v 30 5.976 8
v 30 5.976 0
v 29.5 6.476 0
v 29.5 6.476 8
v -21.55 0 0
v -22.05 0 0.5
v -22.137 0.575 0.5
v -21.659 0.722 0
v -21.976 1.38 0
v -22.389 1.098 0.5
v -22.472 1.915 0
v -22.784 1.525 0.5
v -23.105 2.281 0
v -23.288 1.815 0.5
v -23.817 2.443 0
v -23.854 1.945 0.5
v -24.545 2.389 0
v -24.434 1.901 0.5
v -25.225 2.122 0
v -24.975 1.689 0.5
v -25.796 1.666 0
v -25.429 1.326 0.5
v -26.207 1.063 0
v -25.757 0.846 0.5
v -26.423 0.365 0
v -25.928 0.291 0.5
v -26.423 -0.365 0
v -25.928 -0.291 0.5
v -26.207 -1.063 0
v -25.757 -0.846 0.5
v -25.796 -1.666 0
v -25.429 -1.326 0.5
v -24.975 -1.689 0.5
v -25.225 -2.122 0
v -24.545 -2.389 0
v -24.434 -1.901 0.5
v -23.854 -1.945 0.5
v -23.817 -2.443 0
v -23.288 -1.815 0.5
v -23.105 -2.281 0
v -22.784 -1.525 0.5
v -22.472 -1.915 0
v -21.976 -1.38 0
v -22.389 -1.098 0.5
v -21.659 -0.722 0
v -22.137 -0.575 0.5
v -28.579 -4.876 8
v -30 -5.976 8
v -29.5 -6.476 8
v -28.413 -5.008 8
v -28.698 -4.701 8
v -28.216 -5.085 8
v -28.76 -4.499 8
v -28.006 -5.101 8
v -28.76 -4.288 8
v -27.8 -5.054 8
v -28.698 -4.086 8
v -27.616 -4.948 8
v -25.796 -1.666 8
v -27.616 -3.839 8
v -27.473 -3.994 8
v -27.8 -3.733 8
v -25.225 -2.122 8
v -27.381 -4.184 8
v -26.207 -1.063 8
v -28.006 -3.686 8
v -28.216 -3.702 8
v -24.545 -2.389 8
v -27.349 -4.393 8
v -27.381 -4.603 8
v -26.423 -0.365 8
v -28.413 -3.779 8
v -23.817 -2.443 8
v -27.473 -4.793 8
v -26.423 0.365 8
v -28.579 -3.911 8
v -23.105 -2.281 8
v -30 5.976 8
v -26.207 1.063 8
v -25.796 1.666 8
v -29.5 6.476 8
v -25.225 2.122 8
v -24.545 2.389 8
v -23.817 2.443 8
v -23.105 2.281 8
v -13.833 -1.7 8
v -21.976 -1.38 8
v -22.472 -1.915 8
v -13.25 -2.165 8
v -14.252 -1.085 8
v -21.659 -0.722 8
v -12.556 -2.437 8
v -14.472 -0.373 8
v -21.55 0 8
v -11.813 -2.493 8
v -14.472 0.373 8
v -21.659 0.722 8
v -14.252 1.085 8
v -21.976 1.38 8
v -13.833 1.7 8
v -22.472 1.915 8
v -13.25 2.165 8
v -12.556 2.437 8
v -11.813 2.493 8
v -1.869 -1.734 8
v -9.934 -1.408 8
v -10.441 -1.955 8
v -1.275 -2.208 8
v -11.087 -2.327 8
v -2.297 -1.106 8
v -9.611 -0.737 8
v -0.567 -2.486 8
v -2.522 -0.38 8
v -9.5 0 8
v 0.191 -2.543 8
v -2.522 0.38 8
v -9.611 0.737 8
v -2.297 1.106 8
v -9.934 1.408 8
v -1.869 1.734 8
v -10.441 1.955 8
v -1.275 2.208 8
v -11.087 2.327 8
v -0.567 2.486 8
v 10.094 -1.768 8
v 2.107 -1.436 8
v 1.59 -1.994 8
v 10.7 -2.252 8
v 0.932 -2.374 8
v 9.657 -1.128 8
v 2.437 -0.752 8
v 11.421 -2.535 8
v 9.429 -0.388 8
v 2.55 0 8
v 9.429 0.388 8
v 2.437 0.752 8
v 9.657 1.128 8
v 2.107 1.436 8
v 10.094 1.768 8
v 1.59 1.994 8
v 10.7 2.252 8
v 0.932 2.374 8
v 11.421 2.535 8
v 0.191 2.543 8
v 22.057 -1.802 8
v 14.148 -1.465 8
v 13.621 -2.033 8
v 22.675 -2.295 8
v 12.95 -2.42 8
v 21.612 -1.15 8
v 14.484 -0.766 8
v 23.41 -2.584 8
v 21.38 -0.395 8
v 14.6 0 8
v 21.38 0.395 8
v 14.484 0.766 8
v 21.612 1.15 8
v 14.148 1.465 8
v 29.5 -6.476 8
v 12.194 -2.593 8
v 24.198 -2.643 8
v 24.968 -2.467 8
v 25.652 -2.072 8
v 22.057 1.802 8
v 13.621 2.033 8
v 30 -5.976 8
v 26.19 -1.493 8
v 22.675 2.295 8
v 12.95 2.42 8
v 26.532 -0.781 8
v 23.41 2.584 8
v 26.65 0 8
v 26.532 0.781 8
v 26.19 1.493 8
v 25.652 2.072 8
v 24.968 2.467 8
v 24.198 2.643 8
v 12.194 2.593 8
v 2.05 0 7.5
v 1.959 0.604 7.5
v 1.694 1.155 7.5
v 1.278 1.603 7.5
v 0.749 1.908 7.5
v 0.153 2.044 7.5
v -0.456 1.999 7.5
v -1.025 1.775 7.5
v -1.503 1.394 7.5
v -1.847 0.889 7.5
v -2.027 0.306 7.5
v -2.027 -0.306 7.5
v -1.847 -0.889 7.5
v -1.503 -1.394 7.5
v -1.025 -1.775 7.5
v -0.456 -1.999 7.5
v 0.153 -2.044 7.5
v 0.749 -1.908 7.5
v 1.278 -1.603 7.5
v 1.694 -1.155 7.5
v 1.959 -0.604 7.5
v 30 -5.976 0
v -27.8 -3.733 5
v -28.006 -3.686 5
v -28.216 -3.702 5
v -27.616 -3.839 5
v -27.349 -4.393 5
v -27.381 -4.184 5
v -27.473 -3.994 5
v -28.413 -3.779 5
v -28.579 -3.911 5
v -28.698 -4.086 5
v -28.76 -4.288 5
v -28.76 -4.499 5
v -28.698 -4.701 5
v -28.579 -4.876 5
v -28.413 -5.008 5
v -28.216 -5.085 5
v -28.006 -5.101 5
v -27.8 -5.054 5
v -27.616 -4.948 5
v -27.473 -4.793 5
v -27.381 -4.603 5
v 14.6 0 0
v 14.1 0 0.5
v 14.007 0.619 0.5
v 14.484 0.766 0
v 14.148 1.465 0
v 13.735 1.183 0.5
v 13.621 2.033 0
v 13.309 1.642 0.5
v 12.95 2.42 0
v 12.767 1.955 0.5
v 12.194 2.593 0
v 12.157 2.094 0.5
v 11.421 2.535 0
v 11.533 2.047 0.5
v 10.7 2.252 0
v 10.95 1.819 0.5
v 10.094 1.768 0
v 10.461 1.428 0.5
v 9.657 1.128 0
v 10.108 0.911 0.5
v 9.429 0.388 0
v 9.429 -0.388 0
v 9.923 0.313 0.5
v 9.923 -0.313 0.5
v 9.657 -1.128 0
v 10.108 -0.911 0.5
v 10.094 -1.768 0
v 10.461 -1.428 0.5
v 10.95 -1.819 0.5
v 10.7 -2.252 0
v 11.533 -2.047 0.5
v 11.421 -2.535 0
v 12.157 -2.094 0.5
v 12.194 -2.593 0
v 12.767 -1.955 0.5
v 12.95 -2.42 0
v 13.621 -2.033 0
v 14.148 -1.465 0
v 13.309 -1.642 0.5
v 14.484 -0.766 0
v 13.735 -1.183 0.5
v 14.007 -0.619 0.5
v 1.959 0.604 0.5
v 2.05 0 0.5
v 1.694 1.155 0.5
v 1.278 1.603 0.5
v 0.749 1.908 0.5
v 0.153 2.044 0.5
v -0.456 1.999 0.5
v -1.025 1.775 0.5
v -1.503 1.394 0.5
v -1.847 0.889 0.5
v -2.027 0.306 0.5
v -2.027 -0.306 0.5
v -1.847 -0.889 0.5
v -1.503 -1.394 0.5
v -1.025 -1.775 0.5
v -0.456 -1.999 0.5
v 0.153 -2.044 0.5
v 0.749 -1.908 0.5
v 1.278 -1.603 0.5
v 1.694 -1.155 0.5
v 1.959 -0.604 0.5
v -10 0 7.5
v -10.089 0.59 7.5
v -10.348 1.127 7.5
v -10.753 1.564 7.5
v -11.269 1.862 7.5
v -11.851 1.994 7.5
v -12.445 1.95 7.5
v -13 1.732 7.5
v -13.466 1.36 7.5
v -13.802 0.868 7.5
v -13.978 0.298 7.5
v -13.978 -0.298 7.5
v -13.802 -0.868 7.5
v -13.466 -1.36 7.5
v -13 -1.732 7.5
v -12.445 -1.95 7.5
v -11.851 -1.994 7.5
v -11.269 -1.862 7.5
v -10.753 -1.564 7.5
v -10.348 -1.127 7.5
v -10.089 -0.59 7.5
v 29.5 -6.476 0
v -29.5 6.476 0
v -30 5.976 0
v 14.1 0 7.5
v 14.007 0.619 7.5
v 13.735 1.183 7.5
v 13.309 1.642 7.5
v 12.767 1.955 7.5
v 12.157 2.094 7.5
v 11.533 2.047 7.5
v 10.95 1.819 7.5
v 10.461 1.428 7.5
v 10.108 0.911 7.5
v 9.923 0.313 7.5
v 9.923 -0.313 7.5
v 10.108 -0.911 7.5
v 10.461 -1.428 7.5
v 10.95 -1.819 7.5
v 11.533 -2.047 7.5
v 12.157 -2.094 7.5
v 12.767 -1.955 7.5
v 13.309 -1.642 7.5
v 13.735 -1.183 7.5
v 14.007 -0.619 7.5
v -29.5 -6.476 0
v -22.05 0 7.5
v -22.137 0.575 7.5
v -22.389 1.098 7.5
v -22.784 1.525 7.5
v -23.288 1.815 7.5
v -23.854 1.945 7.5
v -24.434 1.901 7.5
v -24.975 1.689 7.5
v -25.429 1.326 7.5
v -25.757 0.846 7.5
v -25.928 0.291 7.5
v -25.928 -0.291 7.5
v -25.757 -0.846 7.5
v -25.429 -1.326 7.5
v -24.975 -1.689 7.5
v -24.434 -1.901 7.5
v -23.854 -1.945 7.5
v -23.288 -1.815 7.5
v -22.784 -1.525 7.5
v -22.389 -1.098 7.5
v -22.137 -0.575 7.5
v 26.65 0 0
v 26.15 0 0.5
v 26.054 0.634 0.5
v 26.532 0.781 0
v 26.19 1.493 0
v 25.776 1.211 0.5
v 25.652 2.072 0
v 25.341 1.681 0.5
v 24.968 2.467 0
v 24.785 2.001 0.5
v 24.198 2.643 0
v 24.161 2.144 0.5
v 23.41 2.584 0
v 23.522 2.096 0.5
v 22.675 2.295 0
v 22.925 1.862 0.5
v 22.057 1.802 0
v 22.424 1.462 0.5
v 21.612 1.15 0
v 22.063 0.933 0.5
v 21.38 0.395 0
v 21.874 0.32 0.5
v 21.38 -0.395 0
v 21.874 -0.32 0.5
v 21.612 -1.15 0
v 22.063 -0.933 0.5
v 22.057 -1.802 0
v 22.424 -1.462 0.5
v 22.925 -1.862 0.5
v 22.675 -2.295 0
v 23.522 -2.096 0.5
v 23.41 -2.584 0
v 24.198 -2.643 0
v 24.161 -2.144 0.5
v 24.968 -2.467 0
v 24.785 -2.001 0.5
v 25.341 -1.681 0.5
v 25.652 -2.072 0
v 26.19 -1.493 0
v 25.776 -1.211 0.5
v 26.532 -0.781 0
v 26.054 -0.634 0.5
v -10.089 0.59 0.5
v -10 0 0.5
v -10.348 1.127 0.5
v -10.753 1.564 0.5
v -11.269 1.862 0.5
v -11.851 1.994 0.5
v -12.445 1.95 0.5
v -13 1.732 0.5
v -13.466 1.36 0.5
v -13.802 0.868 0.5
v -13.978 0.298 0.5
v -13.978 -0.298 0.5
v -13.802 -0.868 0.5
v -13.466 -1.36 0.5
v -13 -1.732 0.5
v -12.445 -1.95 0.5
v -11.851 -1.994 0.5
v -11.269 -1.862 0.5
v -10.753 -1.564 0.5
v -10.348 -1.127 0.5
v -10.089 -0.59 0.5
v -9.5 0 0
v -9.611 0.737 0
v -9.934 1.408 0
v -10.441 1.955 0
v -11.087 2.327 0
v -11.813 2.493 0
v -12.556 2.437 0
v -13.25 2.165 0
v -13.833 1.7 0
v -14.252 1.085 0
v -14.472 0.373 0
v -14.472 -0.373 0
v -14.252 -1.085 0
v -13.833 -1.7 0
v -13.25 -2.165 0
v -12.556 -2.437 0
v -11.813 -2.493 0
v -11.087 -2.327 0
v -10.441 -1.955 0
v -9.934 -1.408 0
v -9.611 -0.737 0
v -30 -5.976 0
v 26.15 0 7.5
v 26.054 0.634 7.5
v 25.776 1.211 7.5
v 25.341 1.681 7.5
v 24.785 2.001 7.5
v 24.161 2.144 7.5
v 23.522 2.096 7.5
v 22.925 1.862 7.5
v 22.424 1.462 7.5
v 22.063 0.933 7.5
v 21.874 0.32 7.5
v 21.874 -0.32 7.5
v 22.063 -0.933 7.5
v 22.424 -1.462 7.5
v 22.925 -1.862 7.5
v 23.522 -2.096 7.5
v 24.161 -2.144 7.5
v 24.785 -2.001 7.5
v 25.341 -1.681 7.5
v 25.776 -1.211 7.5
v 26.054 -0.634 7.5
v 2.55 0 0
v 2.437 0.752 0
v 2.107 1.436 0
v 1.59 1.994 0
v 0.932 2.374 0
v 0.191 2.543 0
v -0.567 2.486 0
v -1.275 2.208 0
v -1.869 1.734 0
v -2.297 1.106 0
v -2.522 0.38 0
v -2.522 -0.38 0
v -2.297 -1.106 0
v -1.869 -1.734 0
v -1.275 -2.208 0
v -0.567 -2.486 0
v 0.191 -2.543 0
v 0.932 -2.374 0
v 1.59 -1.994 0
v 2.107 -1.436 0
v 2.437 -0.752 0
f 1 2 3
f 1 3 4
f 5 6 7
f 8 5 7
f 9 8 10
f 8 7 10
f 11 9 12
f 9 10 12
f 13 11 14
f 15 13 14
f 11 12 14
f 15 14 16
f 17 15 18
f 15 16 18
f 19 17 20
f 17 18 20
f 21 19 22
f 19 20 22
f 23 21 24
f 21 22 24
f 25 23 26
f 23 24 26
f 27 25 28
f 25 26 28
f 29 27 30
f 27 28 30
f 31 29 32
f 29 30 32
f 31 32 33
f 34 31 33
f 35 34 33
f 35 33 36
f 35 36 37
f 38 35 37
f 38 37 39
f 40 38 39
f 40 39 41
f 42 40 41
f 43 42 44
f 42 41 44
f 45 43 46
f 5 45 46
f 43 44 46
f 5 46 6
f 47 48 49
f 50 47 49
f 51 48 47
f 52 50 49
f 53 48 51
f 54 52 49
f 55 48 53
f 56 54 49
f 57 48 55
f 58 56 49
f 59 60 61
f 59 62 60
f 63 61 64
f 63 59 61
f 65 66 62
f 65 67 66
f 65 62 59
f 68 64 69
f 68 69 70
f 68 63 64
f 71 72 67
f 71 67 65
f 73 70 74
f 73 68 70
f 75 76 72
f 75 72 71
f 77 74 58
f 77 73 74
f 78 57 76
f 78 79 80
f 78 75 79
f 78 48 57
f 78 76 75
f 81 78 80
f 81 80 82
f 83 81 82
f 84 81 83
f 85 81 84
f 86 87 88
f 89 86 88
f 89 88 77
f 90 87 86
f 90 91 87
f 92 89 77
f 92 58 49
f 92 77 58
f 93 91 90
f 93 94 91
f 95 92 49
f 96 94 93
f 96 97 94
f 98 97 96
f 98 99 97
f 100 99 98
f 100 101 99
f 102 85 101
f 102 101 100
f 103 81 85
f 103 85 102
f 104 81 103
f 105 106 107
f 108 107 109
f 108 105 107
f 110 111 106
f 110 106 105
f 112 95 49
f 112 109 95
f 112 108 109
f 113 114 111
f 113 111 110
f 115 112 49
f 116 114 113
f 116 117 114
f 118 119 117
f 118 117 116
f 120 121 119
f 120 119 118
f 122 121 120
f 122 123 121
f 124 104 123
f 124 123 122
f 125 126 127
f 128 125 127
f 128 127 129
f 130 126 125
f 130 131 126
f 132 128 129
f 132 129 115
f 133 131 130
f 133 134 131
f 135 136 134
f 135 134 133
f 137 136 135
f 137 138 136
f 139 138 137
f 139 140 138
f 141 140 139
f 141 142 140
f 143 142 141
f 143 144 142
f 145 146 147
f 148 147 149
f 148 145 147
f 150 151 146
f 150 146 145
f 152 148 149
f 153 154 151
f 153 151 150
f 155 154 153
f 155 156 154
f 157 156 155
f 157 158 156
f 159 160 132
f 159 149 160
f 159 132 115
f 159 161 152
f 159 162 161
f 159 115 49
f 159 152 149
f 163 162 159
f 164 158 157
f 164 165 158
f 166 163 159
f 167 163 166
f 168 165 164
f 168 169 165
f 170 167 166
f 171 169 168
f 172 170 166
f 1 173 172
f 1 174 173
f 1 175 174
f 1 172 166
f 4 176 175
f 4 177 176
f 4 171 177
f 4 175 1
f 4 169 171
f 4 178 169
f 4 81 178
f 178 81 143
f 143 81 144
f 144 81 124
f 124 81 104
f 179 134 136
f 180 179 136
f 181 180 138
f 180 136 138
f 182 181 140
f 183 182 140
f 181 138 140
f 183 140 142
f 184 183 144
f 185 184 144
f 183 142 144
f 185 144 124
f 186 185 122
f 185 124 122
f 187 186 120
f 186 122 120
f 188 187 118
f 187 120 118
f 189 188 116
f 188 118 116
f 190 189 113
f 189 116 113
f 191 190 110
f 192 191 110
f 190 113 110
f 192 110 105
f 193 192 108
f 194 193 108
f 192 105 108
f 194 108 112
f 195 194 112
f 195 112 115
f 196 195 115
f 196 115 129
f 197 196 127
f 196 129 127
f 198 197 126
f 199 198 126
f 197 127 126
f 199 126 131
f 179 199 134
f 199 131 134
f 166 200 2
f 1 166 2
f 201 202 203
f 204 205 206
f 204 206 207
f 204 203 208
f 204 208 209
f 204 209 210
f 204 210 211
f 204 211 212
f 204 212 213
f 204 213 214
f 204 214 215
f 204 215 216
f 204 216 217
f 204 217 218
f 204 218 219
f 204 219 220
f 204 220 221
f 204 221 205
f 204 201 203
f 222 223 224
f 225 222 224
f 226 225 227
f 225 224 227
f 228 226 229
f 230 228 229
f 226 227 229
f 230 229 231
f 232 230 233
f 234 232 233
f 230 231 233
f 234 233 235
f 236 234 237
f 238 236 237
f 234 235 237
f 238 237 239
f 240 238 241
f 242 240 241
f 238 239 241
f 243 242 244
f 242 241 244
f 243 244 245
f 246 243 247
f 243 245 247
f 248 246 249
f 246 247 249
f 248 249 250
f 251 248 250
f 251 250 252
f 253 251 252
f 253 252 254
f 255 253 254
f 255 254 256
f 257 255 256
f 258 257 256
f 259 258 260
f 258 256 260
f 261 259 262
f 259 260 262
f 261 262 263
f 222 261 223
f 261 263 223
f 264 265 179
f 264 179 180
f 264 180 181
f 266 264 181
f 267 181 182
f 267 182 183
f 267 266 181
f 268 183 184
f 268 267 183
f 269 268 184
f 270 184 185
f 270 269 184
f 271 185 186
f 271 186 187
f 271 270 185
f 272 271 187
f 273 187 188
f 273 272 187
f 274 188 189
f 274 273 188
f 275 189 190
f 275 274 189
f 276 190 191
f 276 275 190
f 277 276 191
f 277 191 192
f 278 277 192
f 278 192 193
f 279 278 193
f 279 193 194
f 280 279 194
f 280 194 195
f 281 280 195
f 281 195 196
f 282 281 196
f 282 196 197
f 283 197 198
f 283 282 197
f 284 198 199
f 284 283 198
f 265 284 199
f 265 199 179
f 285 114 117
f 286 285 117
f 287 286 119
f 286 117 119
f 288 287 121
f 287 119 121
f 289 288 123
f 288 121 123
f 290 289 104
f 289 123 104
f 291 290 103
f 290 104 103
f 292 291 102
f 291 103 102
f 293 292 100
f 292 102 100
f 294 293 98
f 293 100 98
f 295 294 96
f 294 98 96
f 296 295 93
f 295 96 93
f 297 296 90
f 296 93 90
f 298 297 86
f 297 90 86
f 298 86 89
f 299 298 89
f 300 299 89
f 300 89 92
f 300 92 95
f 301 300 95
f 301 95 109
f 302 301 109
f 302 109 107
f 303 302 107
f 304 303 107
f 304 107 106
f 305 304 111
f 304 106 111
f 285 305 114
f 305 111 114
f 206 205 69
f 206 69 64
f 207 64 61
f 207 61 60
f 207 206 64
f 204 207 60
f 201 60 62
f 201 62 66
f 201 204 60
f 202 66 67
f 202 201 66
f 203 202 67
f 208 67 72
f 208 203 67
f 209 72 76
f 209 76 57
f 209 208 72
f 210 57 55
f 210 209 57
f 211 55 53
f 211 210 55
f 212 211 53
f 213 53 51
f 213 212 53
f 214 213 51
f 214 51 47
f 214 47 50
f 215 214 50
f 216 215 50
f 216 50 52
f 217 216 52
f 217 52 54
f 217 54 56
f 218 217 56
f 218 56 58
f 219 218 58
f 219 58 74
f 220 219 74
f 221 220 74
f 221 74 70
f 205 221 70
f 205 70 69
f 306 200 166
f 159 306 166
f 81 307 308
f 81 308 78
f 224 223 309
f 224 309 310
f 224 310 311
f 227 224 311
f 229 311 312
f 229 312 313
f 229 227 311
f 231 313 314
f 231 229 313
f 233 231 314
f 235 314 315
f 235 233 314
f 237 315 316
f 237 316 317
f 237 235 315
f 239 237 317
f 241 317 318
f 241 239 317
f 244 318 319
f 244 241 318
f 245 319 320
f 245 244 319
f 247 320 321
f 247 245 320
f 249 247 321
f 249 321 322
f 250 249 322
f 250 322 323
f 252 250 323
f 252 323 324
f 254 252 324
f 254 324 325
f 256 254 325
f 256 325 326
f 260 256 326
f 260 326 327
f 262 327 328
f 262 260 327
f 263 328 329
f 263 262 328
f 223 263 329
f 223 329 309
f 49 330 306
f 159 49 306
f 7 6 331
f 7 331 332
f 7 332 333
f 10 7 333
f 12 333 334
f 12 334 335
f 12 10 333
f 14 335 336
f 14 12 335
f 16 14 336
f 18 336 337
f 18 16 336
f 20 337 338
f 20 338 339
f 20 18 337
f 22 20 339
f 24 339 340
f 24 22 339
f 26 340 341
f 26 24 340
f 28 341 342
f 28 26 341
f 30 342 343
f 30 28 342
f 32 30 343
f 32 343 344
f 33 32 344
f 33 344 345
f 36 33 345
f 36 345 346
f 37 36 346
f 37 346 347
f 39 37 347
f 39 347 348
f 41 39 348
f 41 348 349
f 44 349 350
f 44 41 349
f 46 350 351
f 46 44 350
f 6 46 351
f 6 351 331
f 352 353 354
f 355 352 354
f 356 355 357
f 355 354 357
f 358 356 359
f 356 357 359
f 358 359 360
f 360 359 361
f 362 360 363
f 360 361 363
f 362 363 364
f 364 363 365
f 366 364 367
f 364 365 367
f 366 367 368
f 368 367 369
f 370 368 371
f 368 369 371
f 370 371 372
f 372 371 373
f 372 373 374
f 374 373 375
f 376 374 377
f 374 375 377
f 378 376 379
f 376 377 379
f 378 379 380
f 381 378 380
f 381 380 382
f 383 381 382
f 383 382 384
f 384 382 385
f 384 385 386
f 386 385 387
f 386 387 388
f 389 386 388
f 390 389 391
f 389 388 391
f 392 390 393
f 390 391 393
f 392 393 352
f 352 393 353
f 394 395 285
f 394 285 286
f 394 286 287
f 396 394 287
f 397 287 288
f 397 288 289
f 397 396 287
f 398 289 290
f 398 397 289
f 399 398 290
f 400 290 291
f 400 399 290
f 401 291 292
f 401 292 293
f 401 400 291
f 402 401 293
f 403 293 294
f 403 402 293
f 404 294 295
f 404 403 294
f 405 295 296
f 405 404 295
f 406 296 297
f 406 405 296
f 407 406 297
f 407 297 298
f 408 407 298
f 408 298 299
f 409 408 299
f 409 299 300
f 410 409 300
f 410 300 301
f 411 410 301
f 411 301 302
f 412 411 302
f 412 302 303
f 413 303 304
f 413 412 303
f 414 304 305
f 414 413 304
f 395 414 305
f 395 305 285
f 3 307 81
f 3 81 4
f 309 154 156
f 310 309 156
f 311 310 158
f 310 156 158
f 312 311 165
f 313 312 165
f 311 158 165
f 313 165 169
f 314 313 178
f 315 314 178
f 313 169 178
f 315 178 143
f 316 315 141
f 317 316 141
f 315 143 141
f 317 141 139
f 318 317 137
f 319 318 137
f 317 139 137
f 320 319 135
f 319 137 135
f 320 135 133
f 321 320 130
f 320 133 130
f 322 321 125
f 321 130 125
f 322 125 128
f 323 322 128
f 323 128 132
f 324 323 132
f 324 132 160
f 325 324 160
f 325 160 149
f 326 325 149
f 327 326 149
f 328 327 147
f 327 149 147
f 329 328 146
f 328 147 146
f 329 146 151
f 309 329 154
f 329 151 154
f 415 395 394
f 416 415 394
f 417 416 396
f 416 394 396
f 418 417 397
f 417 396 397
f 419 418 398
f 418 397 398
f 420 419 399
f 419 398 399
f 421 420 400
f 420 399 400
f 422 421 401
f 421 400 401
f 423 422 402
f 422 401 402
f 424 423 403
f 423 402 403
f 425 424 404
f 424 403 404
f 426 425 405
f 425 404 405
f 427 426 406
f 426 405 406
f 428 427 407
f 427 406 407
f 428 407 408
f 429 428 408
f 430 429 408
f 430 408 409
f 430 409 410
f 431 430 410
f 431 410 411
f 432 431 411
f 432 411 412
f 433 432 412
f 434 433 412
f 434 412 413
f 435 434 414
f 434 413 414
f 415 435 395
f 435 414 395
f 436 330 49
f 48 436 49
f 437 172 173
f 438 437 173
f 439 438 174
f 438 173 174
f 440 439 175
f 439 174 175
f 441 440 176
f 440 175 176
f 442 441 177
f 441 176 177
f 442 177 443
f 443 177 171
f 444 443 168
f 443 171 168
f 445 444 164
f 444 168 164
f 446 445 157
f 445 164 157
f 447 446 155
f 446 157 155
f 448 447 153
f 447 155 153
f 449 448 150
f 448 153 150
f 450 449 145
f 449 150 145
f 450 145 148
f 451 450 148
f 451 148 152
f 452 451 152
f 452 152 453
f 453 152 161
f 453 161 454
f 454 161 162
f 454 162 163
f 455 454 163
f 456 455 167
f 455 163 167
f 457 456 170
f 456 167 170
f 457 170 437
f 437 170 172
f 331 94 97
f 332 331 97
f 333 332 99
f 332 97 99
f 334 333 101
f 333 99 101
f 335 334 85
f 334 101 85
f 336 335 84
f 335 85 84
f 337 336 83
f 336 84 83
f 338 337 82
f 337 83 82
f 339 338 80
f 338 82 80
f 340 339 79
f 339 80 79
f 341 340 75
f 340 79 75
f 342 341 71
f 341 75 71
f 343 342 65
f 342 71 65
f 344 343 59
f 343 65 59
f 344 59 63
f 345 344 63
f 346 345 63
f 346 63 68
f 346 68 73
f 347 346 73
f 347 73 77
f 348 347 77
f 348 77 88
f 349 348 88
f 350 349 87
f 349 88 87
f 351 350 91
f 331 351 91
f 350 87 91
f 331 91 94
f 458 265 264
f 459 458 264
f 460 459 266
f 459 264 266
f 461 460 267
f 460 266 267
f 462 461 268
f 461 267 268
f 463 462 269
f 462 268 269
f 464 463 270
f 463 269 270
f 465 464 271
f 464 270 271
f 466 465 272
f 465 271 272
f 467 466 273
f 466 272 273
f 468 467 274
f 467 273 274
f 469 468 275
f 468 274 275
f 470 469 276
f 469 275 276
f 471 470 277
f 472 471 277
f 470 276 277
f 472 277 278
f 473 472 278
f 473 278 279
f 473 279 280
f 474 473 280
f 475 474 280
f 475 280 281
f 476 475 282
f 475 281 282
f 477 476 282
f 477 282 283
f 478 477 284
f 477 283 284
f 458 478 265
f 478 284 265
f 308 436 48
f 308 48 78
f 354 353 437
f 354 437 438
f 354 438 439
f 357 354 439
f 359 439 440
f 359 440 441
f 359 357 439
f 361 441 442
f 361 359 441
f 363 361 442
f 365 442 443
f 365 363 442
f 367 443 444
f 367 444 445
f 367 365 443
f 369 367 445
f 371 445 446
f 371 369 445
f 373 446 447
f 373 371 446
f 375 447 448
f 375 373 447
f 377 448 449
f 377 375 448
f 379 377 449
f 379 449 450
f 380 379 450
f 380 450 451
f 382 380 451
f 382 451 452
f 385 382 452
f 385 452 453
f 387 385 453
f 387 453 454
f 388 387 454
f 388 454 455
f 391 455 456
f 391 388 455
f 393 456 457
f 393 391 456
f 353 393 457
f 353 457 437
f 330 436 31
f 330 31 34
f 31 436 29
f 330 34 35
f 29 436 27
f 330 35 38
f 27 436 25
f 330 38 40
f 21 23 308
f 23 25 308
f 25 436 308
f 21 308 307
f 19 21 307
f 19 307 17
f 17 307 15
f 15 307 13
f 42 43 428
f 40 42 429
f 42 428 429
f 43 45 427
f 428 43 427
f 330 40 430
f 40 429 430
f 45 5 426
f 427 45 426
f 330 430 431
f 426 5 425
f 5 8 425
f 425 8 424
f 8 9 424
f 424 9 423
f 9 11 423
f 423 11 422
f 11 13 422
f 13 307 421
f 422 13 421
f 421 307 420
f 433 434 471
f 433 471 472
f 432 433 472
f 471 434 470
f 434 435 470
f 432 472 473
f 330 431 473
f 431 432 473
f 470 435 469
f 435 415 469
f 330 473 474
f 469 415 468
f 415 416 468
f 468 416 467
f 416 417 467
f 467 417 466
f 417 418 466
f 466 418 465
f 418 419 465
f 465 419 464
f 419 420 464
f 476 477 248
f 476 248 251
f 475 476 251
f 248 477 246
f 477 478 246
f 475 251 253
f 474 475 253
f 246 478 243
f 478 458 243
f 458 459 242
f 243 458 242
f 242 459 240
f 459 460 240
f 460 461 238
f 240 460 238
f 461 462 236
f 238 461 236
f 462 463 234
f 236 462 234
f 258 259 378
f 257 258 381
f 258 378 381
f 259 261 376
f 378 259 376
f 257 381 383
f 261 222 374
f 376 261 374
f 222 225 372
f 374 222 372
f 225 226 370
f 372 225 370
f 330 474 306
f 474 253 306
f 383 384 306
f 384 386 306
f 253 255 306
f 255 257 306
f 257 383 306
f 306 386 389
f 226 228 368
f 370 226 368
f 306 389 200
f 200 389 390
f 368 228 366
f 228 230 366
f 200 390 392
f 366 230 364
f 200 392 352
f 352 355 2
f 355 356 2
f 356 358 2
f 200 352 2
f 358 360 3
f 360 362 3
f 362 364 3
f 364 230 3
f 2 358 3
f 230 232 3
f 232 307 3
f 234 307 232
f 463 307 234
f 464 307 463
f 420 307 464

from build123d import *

# Parameters (mm, degrees)
F0_W     = 60
F0_H     = 12.951542
F0_R     = 0.709255
F0_R_2   = 1.95
F0_R_3   = 2
F0_R_4   = 2.05
F0_R_5   = 2.1
F0_R_6   = 2.15
F1_DEPTH = 8
F2_DEPTH = 5
F3_SIZE  = 0.5


with BuildPart() as f1:
    # F0 (on Top) → F1 (new body)
    with BuildSketch(Plane.XY):
        Rectangle(F0_W, F0_H)
        with Locations((-28.05865, -4.393477)):
            Circle(F0_R, mode=Mode.SUBTRACT)
        with Locations((-24, 0)):
            Circle(F0_R_2, mode=Mode.SUBTRACT)
        with Locations((-12, 0)):
            Circle(F0_R_3, mode=Mode.SUBTRACT)
        Circle(F0_R_4, mode=Mode.SUBTRACT)
        with Locations((12, 0)):
            Circle(F0_R_5, mode=Mode.SUBTRACT)
        with Locations((24, 0)):
            Circle(F0_R_6, mode=Mode.SUBTRACT)
    extrude(amount=F1_DEPTH)

    # F0 (on Top) → F2 (join)
    with BuildSketch(Plane.XY):
        with Locations((-28.05865, -4.393477)):
            Circle(F0_R)
    extrude(amount=F2_DEPTH)

    # F3
    f3_edges = [f1.edges().sort_by_distance(p)[0] for p in [
        (-25.95, 0, 8),
        (-14, 0, 8),
        (-2.05, 0, 8),
        (9.9, 0, 8),
        (21.85, 0, 8),
        (21.85, 0, 0),
        (9.9, 0, 0),
        (-2.05, 0, 0),
        (-14, 0, 0),
        (-25.95, 0, 0),
        (-30, -6.475771, 4),
        (-30, 6.475771, 4),
        (30, 6.475771, 4),
        (30, -6.475771, 4),
    ]]
    chamfer(f3_edges, length=F3_SIZE)


solid = f1.part
